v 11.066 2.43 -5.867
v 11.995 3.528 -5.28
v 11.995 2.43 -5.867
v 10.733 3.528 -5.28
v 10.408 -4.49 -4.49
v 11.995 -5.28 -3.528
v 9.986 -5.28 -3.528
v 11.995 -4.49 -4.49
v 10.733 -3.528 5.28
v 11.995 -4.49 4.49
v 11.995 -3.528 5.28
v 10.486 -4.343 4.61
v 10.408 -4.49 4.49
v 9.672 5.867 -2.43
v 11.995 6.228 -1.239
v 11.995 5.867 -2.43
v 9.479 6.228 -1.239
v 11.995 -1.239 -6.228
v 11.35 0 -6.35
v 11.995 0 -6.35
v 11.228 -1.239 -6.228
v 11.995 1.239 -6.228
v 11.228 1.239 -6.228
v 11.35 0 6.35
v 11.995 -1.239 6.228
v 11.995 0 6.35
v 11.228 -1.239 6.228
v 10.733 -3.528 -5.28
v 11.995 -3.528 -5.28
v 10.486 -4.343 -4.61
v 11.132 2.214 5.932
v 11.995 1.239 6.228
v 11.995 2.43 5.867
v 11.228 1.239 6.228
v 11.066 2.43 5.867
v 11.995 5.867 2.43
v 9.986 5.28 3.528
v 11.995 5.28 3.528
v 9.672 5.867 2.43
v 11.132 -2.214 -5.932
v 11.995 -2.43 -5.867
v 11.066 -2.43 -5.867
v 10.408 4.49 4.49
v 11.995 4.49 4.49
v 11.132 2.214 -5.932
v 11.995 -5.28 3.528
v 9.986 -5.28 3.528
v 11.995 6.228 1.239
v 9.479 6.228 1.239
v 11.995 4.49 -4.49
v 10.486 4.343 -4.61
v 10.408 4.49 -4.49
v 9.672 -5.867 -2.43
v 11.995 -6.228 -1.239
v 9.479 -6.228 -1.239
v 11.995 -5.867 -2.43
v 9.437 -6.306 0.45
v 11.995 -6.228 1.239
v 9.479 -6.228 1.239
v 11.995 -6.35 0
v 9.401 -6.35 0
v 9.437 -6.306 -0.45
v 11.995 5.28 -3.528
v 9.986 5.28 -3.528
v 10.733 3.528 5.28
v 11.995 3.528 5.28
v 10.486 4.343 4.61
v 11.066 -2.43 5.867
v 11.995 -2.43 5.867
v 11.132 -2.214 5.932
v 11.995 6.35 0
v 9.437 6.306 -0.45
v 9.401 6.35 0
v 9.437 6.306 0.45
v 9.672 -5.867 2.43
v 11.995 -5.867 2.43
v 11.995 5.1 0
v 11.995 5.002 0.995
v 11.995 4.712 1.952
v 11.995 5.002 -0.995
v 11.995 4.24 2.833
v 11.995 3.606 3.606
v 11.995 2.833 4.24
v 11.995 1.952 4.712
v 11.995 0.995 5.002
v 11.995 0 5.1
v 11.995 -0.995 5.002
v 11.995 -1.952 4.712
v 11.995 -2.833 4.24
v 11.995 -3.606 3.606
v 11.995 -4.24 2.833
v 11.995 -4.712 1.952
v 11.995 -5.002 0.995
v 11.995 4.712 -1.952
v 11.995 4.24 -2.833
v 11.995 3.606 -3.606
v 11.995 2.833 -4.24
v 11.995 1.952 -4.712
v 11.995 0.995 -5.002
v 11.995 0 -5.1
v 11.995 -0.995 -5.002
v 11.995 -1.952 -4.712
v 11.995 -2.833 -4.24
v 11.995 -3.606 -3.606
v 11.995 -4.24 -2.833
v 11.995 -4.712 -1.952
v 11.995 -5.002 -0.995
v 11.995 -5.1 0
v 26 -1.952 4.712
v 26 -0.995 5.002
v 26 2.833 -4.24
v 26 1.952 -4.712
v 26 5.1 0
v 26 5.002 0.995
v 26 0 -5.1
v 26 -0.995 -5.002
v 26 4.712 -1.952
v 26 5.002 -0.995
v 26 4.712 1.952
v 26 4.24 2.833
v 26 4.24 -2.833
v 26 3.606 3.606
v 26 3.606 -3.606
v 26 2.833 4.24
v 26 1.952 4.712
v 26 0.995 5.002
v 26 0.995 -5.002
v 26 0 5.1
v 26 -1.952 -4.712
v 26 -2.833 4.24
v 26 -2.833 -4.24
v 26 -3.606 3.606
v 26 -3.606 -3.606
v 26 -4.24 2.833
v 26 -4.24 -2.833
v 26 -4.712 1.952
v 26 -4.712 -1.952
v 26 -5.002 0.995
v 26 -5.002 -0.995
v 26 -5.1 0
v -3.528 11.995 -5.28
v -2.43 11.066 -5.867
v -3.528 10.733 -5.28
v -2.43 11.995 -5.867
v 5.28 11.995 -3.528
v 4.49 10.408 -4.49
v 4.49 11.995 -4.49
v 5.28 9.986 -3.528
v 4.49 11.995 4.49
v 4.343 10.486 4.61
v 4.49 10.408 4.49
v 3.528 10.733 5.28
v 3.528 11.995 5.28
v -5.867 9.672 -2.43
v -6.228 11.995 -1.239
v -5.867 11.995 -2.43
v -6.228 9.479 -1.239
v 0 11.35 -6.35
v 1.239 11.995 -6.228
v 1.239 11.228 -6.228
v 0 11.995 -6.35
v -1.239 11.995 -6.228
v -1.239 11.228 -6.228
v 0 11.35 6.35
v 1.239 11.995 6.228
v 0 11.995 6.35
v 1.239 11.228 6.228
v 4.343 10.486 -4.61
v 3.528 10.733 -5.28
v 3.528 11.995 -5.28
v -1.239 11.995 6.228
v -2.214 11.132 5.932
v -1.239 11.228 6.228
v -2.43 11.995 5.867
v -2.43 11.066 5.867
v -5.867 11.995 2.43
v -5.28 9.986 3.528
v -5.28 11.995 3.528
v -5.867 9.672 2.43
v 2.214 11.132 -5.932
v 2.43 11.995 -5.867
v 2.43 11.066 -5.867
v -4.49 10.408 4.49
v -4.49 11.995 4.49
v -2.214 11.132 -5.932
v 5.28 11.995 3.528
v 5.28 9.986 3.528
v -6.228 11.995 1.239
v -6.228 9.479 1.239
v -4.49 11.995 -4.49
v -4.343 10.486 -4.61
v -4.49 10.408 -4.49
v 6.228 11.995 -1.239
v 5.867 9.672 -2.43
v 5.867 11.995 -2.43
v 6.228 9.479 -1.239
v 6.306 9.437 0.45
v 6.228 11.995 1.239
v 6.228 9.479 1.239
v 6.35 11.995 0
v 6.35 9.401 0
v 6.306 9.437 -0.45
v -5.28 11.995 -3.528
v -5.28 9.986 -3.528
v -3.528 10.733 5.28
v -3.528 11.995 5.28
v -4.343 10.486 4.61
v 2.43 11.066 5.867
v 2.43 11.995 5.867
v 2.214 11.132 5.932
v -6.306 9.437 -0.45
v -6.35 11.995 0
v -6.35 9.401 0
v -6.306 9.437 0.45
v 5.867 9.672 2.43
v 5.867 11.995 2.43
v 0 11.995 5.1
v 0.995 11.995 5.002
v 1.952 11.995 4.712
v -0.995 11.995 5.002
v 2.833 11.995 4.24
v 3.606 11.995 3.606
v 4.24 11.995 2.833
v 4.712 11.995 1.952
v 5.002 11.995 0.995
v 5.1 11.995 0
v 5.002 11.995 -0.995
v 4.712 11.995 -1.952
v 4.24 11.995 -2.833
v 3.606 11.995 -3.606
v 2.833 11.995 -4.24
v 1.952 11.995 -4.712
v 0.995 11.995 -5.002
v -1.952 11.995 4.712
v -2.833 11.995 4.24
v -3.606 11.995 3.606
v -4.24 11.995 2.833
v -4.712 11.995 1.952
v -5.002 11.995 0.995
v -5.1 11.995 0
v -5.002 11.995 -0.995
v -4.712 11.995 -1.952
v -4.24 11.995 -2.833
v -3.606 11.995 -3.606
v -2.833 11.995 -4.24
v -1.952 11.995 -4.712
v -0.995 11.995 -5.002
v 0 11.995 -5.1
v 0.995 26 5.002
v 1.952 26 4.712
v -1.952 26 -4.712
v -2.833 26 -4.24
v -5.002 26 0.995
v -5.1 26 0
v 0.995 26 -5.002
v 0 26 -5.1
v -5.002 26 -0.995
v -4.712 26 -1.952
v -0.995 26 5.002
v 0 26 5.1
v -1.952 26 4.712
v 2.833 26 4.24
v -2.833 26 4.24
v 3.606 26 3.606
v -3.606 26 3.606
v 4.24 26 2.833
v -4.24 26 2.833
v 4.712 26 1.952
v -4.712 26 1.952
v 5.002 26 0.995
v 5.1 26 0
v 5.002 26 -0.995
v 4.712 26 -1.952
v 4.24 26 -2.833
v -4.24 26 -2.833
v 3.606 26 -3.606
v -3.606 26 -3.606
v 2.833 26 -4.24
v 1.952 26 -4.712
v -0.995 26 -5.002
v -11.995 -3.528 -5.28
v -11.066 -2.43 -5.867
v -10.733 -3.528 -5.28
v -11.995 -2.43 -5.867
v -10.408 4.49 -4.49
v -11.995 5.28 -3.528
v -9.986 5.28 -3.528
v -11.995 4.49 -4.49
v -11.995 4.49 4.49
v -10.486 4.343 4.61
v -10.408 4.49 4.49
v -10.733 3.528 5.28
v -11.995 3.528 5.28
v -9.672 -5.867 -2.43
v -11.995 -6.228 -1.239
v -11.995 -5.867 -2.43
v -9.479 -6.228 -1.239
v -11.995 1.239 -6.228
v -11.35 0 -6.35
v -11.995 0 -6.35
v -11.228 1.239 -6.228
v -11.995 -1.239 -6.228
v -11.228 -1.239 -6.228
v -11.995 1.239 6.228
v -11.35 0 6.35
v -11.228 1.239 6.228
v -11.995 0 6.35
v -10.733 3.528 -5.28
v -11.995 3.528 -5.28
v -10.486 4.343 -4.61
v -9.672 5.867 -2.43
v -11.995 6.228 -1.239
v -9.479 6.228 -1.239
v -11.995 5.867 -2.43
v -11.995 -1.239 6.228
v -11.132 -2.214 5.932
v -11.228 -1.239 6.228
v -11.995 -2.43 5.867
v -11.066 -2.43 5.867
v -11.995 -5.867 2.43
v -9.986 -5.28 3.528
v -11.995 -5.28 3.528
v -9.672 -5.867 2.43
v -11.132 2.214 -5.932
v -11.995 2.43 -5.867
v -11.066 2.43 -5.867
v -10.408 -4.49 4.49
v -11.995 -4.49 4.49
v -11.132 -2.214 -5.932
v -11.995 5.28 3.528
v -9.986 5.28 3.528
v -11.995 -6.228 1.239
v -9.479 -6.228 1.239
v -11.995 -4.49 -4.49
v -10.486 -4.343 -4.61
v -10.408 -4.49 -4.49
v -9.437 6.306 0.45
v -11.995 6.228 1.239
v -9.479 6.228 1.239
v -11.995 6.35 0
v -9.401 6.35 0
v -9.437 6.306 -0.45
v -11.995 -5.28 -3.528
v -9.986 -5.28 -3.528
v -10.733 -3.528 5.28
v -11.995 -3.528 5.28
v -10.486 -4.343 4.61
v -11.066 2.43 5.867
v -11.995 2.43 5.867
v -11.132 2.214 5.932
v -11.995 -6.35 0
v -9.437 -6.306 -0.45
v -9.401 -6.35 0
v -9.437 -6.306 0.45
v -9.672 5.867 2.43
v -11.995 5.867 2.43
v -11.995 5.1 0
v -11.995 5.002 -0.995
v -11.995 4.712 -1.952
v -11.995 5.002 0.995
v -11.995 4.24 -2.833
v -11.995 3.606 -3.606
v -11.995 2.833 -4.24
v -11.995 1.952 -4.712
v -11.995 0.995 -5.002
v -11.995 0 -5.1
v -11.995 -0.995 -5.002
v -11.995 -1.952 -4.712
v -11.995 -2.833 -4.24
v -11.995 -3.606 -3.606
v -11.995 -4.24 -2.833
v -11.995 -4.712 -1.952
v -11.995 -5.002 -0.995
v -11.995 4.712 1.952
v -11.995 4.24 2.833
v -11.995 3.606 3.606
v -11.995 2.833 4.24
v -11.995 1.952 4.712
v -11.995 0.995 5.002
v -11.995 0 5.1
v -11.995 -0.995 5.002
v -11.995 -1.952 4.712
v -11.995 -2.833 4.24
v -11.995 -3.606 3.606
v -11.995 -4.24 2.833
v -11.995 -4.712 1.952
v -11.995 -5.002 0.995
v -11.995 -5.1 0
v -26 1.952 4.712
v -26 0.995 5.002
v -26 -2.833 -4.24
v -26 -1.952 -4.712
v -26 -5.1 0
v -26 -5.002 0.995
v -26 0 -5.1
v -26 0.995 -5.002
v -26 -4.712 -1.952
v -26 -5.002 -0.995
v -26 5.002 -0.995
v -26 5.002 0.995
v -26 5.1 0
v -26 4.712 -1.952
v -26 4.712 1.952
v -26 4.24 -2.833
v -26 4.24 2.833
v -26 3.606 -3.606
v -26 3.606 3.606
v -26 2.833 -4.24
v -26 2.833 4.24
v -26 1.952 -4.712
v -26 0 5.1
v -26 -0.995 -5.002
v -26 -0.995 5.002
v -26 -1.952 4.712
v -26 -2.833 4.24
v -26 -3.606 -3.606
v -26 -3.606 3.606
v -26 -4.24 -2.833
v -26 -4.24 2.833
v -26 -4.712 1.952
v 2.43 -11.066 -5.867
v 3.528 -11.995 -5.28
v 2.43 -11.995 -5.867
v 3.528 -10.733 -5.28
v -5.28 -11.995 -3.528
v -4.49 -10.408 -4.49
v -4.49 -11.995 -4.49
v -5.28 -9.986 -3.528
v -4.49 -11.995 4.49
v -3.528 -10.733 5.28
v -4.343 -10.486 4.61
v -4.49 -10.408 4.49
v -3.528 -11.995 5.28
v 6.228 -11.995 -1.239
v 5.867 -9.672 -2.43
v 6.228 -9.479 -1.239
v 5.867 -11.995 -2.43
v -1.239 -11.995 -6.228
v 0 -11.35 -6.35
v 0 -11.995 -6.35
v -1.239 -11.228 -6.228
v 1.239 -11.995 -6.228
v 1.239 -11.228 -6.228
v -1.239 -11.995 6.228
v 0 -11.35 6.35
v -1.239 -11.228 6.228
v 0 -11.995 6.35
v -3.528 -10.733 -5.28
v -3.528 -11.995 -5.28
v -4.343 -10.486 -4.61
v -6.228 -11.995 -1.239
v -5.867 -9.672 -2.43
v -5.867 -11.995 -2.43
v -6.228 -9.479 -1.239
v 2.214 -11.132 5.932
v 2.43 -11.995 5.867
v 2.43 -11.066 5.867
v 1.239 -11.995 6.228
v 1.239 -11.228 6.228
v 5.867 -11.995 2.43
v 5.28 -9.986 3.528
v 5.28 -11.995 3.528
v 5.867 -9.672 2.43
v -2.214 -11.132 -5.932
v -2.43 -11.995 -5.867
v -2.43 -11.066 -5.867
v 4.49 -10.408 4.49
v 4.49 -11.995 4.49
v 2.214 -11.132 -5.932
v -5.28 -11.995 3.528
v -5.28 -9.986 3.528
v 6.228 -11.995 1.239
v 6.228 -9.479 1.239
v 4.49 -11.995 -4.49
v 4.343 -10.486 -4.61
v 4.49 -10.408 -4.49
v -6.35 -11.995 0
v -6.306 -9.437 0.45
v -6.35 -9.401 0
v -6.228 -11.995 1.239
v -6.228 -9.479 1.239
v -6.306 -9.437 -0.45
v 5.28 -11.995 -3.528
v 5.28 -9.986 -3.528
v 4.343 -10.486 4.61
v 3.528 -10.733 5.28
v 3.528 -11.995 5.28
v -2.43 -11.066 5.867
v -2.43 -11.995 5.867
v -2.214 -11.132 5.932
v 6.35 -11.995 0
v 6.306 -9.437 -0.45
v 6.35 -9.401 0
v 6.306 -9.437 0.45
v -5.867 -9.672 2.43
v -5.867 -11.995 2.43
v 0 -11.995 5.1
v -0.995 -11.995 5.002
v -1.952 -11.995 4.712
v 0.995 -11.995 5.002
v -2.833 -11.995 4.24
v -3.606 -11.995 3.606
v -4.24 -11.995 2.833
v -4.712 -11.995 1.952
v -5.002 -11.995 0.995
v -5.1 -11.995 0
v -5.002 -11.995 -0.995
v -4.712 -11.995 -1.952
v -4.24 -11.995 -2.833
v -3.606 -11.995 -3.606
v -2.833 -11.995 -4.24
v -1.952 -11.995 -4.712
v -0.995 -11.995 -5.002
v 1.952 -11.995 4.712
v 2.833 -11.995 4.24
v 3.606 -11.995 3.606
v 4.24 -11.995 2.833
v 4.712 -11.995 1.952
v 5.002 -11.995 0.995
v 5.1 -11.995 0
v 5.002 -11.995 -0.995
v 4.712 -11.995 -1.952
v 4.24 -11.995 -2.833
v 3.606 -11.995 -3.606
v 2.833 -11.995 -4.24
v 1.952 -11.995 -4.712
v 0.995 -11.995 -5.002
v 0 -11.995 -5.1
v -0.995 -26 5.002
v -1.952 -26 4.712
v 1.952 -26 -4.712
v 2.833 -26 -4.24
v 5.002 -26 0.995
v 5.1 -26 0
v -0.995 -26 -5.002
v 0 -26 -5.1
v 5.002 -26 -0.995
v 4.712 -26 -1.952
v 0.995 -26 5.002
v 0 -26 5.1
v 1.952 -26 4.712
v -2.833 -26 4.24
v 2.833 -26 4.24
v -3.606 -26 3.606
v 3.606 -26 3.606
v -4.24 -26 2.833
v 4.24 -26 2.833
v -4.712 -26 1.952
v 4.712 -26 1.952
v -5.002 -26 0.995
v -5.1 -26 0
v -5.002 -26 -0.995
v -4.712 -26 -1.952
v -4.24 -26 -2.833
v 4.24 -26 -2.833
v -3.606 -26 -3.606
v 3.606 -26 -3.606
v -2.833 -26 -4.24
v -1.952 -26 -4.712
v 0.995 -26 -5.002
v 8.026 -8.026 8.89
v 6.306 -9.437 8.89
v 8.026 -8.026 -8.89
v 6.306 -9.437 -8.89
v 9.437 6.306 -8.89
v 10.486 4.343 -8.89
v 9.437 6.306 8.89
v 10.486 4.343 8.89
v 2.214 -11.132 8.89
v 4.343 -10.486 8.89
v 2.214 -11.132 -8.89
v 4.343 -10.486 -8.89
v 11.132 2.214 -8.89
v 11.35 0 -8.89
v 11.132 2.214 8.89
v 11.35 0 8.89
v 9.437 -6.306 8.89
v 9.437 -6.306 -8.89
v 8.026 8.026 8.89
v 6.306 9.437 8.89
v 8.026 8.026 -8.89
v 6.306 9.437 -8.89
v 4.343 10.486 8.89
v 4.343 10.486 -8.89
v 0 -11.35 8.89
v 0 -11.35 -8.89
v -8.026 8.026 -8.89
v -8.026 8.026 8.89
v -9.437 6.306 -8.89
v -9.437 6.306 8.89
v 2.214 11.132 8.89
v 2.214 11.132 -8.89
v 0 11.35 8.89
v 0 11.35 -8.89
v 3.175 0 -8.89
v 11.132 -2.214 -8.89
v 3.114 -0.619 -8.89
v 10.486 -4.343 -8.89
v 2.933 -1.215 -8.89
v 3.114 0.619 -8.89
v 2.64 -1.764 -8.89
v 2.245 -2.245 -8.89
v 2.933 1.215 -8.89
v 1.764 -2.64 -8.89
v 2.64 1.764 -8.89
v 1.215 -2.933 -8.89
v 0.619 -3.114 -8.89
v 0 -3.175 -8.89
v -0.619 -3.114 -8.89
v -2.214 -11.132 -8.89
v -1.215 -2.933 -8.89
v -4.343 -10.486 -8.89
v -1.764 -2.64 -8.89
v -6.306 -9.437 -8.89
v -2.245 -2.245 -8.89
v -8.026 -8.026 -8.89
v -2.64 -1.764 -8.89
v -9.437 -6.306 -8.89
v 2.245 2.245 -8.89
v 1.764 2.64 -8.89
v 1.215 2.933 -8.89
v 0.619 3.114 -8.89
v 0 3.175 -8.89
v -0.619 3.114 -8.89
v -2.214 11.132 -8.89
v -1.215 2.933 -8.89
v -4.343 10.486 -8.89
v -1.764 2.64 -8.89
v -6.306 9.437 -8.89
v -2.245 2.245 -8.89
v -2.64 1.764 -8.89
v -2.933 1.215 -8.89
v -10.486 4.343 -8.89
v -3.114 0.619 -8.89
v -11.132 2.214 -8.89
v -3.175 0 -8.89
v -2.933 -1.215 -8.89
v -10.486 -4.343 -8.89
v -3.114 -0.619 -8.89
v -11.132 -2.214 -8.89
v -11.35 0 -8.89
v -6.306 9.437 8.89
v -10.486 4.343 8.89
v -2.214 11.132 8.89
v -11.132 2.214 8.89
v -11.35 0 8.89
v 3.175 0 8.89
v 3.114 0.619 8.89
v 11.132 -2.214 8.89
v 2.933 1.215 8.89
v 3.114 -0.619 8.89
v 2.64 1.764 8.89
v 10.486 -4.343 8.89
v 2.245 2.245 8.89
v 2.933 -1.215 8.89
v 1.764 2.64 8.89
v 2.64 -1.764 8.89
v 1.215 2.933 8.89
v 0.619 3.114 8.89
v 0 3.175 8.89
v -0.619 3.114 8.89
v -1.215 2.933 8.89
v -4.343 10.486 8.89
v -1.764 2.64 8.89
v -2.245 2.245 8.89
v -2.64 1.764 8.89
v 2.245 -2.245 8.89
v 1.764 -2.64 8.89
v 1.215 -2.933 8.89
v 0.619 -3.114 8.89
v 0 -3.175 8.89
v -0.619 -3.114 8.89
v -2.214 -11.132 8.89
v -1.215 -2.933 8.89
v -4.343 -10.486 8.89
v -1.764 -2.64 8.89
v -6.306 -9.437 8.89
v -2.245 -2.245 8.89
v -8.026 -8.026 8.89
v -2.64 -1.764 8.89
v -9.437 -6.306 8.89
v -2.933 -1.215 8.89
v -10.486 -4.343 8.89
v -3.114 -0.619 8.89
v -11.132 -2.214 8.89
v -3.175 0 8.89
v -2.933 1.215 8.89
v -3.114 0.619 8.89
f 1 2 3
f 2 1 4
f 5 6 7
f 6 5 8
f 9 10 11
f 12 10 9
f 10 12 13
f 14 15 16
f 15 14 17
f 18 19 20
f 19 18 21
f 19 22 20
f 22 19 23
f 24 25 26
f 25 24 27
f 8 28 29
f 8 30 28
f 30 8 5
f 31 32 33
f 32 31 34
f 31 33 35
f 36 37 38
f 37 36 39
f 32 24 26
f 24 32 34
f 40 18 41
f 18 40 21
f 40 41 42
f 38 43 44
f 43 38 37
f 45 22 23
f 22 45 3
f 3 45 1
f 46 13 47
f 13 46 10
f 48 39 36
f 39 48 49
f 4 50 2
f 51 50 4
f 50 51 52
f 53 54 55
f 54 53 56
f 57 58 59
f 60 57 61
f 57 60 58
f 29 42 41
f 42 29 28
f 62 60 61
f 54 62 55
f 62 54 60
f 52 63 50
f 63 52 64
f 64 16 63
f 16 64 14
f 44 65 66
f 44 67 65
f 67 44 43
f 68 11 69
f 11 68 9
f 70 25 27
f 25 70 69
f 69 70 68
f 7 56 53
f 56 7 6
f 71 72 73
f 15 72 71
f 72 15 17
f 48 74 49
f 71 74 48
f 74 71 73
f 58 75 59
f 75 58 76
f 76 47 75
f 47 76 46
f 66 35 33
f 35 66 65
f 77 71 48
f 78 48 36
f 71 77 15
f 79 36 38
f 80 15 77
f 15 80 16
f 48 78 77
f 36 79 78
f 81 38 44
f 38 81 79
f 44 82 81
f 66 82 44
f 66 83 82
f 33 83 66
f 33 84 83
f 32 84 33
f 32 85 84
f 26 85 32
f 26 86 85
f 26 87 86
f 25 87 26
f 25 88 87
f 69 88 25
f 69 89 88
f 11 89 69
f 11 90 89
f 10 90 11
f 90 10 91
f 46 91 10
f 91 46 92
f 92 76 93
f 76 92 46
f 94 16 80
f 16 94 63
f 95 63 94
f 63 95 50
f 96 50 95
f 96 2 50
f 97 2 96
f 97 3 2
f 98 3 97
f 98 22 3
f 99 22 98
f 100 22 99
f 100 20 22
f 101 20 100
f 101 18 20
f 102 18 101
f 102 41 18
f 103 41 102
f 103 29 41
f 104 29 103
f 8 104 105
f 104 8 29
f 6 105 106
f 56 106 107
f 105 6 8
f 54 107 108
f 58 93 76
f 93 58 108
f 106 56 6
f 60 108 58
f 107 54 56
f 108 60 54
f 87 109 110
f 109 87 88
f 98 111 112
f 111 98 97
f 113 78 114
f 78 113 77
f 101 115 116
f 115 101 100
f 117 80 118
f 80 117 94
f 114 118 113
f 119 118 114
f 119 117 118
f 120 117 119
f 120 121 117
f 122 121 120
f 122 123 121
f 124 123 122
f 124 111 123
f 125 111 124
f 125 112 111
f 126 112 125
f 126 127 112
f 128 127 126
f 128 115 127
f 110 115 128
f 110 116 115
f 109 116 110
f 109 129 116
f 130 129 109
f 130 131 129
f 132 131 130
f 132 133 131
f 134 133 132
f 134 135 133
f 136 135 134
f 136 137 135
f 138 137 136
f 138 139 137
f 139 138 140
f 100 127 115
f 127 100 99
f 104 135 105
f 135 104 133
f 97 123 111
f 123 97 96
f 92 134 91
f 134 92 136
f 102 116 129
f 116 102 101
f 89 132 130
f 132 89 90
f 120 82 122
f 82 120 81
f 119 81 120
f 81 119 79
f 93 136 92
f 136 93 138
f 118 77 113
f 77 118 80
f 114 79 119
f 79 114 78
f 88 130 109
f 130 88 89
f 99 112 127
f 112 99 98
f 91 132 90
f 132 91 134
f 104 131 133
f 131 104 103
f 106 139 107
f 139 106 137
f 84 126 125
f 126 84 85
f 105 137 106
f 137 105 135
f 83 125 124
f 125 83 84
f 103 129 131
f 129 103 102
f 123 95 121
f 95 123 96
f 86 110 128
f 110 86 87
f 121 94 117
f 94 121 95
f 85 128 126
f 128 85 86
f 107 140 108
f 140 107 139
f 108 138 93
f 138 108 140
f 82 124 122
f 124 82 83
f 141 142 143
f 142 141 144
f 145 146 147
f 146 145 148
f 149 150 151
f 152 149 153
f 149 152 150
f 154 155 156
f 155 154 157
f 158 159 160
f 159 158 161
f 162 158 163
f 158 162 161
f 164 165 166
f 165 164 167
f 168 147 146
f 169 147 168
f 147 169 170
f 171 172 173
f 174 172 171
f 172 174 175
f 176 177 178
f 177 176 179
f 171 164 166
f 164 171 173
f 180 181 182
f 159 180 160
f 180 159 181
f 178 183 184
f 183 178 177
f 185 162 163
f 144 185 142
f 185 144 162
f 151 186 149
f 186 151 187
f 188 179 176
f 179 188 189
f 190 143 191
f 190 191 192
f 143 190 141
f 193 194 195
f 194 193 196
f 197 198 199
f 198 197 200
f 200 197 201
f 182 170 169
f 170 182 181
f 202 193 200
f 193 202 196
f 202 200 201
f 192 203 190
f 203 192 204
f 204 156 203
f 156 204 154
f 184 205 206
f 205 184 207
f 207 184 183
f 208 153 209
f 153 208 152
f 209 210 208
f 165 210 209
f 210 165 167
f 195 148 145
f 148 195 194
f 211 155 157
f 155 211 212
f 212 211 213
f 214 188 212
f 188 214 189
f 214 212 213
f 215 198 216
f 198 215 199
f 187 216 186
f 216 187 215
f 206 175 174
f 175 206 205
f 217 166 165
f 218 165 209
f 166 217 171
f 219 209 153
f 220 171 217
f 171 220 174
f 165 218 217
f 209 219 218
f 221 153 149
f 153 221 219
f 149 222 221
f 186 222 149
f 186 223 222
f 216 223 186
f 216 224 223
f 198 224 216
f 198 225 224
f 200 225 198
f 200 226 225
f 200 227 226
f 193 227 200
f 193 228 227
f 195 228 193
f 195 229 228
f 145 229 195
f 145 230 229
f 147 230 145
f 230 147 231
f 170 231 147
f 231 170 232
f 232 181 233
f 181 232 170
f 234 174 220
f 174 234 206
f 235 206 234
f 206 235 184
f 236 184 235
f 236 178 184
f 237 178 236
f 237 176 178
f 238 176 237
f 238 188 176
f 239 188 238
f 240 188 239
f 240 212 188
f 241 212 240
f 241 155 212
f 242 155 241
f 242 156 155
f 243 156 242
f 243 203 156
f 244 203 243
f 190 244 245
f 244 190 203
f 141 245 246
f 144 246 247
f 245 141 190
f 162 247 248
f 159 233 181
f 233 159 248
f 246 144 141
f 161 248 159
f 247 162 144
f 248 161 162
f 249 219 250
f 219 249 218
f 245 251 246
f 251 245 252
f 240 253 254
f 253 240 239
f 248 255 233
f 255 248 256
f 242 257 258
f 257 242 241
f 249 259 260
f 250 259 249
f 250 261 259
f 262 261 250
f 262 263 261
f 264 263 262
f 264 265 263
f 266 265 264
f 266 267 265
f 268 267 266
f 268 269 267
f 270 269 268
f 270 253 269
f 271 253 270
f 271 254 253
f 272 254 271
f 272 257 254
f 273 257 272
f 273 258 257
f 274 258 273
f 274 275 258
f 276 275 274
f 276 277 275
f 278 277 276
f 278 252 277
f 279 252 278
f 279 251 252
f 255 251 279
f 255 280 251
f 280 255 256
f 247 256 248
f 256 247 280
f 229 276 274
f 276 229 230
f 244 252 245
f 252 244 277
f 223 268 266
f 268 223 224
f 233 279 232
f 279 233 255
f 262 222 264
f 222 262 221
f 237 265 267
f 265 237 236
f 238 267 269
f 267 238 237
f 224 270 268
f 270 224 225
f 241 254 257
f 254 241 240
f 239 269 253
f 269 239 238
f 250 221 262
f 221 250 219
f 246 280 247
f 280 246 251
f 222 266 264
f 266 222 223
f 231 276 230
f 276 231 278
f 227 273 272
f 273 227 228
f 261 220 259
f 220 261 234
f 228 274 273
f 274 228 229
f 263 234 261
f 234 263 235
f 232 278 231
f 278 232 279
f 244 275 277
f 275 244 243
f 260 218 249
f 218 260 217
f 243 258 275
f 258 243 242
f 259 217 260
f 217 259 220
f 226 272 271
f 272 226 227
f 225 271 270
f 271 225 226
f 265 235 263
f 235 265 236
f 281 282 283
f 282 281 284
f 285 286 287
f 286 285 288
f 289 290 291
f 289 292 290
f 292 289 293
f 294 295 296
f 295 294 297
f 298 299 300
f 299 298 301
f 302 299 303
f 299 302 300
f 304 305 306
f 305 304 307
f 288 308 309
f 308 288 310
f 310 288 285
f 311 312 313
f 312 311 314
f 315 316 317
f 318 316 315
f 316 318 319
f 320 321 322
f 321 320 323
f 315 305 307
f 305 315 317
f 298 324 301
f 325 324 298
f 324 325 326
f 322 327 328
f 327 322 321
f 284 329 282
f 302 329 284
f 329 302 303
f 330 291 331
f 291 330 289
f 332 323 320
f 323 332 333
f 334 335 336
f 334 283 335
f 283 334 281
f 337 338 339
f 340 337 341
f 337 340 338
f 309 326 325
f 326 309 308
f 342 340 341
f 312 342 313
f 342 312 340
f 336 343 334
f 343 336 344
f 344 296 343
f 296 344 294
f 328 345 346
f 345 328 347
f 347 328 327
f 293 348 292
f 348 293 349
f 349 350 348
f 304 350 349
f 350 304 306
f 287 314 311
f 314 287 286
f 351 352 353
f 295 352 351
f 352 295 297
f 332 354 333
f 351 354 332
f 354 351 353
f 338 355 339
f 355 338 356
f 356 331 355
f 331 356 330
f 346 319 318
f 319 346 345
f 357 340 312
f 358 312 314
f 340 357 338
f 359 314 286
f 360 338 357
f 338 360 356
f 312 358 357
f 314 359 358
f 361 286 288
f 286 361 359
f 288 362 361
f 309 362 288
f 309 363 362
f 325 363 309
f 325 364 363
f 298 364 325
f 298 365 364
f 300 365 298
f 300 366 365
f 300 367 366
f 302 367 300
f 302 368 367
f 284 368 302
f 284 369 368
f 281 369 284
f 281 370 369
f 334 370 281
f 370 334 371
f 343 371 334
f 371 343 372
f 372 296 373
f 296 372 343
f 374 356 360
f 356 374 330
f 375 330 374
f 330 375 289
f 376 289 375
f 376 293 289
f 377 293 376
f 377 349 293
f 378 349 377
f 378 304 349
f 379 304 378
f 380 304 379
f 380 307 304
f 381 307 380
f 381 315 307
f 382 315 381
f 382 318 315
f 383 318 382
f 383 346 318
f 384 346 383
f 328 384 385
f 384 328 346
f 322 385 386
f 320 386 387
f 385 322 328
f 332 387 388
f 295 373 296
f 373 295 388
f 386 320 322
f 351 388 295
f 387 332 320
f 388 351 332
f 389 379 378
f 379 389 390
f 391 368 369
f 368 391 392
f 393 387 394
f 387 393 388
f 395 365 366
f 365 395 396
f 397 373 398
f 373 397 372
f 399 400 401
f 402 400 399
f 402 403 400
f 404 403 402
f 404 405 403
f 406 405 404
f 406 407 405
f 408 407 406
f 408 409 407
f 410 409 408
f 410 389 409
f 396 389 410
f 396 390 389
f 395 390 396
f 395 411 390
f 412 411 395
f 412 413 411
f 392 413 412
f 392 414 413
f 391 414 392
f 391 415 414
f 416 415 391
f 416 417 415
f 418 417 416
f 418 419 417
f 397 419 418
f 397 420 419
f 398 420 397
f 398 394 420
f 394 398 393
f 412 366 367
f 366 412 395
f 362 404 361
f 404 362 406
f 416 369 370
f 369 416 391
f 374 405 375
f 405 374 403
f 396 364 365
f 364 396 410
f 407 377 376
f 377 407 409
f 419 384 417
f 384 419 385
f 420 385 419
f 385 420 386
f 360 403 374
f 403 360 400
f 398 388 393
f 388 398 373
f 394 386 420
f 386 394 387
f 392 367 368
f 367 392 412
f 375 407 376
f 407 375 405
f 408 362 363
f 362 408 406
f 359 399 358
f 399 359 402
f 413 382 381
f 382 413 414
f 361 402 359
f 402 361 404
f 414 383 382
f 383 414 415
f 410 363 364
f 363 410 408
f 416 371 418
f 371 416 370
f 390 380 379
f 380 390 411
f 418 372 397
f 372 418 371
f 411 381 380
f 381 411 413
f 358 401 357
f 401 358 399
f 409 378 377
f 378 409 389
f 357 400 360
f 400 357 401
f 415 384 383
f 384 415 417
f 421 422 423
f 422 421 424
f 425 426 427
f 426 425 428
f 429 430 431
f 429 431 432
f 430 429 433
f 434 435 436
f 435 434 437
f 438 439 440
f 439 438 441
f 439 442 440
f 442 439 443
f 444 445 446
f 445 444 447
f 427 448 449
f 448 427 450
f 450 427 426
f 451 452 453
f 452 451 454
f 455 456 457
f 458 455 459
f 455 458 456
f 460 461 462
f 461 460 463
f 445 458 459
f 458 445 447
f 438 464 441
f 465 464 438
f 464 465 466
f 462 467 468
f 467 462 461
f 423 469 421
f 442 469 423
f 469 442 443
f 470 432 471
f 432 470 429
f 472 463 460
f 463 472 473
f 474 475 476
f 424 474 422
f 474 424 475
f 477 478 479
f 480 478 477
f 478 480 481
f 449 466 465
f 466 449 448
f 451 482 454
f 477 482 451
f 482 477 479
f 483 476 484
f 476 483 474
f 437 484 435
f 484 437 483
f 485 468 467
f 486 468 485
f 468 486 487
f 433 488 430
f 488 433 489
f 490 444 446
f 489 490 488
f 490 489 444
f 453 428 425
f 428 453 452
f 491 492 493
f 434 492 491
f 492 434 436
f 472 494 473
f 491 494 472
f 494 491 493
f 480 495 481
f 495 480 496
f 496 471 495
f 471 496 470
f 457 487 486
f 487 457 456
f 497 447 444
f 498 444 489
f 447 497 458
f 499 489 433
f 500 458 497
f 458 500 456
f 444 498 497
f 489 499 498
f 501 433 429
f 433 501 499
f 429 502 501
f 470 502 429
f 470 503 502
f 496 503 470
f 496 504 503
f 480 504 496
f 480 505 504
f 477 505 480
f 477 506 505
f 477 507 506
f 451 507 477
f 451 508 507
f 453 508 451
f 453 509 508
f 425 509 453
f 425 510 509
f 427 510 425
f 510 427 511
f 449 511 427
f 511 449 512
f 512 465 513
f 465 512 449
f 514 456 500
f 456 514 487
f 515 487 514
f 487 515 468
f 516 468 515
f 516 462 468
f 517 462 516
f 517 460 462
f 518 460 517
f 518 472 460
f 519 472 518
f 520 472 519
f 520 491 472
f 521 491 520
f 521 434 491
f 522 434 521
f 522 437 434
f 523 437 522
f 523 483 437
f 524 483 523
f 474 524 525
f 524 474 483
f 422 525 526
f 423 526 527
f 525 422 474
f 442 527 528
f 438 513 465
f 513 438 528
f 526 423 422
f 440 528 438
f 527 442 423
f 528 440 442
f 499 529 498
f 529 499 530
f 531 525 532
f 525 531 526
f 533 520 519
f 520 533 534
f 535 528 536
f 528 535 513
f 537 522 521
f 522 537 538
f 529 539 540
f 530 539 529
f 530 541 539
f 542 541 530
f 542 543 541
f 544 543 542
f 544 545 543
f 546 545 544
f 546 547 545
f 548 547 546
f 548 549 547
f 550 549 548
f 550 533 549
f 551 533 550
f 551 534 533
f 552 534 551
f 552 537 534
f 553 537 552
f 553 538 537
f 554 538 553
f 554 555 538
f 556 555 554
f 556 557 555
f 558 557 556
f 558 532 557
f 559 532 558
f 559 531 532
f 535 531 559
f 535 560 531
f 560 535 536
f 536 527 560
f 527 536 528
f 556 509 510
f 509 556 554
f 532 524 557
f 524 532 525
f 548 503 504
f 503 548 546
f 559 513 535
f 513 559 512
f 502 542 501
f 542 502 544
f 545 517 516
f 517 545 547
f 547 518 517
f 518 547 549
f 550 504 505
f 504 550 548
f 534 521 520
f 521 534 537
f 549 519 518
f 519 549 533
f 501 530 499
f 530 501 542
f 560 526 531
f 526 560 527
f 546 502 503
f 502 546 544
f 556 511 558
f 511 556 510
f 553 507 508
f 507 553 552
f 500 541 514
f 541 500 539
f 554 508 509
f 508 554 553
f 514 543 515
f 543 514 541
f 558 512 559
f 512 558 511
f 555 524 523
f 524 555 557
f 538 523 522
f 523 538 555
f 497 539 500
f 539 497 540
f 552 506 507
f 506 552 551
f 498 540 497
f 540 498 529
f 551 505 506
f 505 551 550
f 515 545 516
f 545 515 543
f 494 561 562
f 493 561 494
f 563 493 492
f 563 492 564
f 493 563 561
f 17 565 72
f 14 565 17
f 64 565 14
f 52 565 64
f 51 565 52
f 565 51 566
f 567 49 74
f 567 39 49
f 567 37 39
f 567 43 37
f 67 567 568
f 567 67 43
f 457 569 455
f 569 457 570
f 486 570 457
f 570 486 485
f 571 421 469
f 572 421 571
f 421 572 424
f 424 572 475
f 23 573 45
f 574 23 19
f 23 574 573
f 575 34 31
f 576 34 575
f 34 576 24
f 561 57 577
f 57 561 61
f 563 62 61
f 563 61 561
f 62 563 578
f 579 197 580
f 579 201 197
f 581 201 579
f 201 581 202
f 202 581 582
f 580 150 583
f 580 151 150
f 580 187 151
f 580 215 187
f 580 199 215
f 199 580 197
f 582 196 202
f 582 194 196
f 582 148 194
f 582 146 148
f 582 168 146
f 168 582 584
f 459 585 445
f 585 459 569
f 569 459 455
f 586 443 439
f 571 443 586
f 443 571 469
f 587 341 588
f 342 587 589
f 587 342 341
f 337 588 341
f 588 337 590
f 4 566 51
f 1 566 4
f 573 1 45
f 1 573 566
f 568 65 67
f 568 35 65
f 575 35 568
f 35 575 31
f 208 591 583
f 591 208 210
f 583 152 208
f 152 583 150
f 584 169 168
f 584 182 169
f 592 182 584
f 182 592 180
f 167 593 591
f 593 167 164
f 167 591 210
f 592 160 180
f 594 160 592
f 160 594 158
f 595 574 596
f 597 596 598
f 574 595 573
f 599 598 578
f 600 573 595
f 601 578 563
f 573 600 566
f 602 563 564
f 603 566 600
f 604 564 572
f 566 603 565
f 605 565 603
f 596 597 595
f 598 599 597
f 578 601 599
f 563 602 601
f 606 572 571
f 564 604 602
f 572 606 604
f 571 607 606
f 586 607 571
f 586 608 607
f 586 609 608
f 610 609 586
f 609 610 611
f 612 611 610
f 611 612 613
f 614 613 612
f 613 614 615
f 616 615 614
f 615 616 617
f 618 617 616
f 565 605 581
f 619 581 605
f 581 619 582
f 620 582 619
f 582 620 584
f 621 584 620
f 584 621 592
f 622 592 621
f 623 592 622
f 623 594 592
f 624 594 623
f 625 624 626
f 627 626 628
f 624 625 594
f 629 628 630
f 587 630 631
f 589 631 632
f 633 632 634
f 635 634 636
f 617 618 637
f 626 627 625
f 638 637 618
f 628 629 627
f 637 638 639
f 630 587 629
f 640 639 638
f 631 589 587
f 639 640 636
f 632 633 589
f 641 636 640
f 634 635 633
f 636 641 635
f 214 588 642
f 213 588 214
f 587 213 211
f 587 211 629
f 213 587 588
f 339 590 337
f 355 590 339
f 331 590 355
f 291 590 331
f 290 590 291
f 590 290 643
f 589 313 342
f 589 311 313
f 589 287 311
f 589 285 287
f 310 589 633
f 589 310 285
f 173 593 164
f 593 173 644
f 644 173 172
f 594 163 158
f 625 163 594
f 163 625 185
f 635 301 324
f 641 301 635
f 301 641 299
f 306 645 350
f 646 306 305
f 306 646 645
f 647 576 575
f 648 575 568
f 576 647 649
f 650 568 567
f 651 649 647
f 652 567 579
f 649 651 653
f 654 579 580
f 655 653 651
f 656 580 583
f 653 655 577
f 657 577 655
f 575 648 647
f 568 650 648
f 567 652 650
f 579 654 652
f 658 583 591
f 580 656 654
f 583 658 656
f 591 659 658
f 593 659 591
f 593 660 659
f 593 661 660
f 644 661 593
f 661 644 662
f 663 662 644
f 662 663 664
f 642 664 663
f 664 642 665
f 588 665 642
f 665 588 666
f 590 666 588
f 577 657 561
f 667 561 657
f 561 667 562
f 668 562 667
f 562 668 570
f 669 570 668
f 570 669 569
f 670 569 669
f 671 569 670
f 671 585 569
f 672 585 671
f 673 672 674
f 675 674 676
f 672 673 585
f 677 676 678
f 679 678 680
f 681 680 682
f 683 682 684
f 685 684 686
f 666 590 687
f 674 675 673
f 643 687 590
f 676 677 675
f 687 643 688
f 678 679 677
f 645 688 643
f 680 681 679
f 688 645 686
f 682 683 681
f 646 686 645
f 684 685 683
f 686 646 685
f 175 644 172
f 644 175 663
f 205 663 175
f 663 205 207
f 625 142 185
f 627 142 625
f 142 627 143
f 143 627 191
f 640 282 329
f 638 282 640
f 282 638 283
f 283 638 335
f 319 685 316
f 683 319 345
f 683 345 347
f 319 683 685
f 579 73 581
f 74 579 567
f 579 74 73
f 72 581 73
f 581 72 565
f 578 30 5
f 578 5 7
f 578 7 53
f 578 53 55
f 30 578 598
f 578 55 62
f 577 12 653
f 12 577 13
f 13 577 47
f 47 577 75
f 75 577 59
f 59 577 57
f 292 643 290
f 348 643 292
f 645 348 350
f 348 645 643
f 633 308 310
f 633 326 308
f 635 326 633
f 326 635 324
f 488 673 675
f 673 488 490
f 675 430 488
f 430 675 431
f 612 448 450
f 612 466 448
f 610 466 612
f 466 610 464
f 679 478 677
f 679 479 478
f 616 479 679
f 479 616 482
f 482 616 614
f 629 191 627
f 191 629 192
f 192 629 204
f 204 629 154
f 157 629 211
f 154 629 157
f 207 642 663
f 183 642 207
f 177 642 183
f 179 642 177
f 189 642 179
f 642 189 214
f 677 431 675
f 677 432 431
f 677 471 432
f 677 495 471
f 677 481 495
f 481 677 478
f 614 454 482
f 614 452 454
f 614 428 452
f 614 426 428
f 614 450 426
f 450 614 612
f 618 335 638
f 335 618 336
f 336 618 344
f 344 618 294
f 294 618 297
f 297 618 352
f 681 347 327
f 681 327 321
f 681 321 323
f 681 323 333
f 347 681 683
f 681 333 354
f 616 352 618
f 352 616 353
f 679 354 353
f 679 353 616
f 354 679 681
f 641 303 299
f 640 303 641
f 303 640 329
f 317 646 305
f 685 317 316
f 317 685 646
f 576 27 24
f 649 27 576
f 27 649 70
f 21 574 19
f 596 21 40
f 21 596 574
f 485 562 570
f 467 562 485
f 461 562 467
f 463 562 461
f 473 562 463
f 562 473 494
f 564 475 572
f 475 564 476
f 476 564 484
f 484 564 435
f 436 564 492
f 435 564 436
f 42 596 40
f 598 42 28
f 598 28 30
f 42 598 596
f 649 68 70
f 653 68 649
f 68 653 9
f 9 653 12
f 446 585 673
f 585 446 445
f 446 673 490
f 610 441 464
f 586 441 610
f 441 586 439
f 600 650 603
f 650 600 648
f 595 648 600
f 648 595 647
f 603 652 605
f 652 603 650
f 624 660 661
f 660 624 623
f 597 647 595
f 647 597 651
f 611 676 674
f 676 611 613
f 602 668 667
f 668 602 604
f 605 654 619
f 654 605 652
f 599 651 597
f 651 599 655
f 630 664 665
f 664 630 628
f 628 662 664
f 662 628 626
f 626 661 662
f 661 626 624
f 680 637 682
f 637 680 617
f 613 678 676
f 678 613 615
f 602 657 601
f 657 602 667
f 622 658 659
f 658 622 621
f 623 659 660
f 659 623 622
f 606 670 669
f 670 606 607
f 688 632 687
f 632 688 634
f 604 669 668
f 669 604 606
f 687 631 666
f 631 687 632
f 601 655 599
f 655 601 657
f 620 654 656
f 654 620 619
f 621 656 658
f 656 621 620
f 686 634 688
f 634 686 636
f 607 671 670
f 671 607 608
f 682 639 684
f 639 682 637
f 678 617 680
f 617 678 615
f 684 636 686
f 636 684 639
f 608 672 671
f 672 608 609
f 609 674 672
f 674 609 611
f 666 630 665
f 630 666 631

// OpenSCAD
$fn = 32;

// ----------------------------------------------------------------------
// Cardan cross: 52 mm span, 12.7 mm trunnions
// ----------------------------------------------------------------------

// --- parameters (mm) ---
journal_d = 12.7;         // trunnion diameter
arm_len = 26;             // trunnion length from the centre
step_r = 4.32;            // step position from the centre
step_d = 10.2;            // journal diameter after the step
hub_d = 22.7;             // hub diameter
hub_h = 17.78;            // hub height
bore_d = 6.35;            // hub bore

difference() {
  union() {
    /* hub along the joint axis */
    cylinder(h = hub_h, d = hub_d, center = true);
    for (a = [0 : 90 : 270]) rotate([0, 0, a]) {
      /* trunnion, sunk into the hub */
      translate([hub_d / 4, 0, 0]) rotate([0, 90, 0]) cylinder(h = step_r + 2, d = journal_d);
      /* stepped journal out to the tip */
      translate([step_r - 0.5, 0, 0]) rotate([0, 90, 0]) cylinder(h = arm_len + 0.5 - step_r, d = step_d);
    }
  }
  /* lubrication bore through the hub, 2.5 mm clear on both sides */
  translate([0, 0, -hub_h / 2 - 2.5]) cylinder(h = hub_h + 5, d = bore_d);
}
